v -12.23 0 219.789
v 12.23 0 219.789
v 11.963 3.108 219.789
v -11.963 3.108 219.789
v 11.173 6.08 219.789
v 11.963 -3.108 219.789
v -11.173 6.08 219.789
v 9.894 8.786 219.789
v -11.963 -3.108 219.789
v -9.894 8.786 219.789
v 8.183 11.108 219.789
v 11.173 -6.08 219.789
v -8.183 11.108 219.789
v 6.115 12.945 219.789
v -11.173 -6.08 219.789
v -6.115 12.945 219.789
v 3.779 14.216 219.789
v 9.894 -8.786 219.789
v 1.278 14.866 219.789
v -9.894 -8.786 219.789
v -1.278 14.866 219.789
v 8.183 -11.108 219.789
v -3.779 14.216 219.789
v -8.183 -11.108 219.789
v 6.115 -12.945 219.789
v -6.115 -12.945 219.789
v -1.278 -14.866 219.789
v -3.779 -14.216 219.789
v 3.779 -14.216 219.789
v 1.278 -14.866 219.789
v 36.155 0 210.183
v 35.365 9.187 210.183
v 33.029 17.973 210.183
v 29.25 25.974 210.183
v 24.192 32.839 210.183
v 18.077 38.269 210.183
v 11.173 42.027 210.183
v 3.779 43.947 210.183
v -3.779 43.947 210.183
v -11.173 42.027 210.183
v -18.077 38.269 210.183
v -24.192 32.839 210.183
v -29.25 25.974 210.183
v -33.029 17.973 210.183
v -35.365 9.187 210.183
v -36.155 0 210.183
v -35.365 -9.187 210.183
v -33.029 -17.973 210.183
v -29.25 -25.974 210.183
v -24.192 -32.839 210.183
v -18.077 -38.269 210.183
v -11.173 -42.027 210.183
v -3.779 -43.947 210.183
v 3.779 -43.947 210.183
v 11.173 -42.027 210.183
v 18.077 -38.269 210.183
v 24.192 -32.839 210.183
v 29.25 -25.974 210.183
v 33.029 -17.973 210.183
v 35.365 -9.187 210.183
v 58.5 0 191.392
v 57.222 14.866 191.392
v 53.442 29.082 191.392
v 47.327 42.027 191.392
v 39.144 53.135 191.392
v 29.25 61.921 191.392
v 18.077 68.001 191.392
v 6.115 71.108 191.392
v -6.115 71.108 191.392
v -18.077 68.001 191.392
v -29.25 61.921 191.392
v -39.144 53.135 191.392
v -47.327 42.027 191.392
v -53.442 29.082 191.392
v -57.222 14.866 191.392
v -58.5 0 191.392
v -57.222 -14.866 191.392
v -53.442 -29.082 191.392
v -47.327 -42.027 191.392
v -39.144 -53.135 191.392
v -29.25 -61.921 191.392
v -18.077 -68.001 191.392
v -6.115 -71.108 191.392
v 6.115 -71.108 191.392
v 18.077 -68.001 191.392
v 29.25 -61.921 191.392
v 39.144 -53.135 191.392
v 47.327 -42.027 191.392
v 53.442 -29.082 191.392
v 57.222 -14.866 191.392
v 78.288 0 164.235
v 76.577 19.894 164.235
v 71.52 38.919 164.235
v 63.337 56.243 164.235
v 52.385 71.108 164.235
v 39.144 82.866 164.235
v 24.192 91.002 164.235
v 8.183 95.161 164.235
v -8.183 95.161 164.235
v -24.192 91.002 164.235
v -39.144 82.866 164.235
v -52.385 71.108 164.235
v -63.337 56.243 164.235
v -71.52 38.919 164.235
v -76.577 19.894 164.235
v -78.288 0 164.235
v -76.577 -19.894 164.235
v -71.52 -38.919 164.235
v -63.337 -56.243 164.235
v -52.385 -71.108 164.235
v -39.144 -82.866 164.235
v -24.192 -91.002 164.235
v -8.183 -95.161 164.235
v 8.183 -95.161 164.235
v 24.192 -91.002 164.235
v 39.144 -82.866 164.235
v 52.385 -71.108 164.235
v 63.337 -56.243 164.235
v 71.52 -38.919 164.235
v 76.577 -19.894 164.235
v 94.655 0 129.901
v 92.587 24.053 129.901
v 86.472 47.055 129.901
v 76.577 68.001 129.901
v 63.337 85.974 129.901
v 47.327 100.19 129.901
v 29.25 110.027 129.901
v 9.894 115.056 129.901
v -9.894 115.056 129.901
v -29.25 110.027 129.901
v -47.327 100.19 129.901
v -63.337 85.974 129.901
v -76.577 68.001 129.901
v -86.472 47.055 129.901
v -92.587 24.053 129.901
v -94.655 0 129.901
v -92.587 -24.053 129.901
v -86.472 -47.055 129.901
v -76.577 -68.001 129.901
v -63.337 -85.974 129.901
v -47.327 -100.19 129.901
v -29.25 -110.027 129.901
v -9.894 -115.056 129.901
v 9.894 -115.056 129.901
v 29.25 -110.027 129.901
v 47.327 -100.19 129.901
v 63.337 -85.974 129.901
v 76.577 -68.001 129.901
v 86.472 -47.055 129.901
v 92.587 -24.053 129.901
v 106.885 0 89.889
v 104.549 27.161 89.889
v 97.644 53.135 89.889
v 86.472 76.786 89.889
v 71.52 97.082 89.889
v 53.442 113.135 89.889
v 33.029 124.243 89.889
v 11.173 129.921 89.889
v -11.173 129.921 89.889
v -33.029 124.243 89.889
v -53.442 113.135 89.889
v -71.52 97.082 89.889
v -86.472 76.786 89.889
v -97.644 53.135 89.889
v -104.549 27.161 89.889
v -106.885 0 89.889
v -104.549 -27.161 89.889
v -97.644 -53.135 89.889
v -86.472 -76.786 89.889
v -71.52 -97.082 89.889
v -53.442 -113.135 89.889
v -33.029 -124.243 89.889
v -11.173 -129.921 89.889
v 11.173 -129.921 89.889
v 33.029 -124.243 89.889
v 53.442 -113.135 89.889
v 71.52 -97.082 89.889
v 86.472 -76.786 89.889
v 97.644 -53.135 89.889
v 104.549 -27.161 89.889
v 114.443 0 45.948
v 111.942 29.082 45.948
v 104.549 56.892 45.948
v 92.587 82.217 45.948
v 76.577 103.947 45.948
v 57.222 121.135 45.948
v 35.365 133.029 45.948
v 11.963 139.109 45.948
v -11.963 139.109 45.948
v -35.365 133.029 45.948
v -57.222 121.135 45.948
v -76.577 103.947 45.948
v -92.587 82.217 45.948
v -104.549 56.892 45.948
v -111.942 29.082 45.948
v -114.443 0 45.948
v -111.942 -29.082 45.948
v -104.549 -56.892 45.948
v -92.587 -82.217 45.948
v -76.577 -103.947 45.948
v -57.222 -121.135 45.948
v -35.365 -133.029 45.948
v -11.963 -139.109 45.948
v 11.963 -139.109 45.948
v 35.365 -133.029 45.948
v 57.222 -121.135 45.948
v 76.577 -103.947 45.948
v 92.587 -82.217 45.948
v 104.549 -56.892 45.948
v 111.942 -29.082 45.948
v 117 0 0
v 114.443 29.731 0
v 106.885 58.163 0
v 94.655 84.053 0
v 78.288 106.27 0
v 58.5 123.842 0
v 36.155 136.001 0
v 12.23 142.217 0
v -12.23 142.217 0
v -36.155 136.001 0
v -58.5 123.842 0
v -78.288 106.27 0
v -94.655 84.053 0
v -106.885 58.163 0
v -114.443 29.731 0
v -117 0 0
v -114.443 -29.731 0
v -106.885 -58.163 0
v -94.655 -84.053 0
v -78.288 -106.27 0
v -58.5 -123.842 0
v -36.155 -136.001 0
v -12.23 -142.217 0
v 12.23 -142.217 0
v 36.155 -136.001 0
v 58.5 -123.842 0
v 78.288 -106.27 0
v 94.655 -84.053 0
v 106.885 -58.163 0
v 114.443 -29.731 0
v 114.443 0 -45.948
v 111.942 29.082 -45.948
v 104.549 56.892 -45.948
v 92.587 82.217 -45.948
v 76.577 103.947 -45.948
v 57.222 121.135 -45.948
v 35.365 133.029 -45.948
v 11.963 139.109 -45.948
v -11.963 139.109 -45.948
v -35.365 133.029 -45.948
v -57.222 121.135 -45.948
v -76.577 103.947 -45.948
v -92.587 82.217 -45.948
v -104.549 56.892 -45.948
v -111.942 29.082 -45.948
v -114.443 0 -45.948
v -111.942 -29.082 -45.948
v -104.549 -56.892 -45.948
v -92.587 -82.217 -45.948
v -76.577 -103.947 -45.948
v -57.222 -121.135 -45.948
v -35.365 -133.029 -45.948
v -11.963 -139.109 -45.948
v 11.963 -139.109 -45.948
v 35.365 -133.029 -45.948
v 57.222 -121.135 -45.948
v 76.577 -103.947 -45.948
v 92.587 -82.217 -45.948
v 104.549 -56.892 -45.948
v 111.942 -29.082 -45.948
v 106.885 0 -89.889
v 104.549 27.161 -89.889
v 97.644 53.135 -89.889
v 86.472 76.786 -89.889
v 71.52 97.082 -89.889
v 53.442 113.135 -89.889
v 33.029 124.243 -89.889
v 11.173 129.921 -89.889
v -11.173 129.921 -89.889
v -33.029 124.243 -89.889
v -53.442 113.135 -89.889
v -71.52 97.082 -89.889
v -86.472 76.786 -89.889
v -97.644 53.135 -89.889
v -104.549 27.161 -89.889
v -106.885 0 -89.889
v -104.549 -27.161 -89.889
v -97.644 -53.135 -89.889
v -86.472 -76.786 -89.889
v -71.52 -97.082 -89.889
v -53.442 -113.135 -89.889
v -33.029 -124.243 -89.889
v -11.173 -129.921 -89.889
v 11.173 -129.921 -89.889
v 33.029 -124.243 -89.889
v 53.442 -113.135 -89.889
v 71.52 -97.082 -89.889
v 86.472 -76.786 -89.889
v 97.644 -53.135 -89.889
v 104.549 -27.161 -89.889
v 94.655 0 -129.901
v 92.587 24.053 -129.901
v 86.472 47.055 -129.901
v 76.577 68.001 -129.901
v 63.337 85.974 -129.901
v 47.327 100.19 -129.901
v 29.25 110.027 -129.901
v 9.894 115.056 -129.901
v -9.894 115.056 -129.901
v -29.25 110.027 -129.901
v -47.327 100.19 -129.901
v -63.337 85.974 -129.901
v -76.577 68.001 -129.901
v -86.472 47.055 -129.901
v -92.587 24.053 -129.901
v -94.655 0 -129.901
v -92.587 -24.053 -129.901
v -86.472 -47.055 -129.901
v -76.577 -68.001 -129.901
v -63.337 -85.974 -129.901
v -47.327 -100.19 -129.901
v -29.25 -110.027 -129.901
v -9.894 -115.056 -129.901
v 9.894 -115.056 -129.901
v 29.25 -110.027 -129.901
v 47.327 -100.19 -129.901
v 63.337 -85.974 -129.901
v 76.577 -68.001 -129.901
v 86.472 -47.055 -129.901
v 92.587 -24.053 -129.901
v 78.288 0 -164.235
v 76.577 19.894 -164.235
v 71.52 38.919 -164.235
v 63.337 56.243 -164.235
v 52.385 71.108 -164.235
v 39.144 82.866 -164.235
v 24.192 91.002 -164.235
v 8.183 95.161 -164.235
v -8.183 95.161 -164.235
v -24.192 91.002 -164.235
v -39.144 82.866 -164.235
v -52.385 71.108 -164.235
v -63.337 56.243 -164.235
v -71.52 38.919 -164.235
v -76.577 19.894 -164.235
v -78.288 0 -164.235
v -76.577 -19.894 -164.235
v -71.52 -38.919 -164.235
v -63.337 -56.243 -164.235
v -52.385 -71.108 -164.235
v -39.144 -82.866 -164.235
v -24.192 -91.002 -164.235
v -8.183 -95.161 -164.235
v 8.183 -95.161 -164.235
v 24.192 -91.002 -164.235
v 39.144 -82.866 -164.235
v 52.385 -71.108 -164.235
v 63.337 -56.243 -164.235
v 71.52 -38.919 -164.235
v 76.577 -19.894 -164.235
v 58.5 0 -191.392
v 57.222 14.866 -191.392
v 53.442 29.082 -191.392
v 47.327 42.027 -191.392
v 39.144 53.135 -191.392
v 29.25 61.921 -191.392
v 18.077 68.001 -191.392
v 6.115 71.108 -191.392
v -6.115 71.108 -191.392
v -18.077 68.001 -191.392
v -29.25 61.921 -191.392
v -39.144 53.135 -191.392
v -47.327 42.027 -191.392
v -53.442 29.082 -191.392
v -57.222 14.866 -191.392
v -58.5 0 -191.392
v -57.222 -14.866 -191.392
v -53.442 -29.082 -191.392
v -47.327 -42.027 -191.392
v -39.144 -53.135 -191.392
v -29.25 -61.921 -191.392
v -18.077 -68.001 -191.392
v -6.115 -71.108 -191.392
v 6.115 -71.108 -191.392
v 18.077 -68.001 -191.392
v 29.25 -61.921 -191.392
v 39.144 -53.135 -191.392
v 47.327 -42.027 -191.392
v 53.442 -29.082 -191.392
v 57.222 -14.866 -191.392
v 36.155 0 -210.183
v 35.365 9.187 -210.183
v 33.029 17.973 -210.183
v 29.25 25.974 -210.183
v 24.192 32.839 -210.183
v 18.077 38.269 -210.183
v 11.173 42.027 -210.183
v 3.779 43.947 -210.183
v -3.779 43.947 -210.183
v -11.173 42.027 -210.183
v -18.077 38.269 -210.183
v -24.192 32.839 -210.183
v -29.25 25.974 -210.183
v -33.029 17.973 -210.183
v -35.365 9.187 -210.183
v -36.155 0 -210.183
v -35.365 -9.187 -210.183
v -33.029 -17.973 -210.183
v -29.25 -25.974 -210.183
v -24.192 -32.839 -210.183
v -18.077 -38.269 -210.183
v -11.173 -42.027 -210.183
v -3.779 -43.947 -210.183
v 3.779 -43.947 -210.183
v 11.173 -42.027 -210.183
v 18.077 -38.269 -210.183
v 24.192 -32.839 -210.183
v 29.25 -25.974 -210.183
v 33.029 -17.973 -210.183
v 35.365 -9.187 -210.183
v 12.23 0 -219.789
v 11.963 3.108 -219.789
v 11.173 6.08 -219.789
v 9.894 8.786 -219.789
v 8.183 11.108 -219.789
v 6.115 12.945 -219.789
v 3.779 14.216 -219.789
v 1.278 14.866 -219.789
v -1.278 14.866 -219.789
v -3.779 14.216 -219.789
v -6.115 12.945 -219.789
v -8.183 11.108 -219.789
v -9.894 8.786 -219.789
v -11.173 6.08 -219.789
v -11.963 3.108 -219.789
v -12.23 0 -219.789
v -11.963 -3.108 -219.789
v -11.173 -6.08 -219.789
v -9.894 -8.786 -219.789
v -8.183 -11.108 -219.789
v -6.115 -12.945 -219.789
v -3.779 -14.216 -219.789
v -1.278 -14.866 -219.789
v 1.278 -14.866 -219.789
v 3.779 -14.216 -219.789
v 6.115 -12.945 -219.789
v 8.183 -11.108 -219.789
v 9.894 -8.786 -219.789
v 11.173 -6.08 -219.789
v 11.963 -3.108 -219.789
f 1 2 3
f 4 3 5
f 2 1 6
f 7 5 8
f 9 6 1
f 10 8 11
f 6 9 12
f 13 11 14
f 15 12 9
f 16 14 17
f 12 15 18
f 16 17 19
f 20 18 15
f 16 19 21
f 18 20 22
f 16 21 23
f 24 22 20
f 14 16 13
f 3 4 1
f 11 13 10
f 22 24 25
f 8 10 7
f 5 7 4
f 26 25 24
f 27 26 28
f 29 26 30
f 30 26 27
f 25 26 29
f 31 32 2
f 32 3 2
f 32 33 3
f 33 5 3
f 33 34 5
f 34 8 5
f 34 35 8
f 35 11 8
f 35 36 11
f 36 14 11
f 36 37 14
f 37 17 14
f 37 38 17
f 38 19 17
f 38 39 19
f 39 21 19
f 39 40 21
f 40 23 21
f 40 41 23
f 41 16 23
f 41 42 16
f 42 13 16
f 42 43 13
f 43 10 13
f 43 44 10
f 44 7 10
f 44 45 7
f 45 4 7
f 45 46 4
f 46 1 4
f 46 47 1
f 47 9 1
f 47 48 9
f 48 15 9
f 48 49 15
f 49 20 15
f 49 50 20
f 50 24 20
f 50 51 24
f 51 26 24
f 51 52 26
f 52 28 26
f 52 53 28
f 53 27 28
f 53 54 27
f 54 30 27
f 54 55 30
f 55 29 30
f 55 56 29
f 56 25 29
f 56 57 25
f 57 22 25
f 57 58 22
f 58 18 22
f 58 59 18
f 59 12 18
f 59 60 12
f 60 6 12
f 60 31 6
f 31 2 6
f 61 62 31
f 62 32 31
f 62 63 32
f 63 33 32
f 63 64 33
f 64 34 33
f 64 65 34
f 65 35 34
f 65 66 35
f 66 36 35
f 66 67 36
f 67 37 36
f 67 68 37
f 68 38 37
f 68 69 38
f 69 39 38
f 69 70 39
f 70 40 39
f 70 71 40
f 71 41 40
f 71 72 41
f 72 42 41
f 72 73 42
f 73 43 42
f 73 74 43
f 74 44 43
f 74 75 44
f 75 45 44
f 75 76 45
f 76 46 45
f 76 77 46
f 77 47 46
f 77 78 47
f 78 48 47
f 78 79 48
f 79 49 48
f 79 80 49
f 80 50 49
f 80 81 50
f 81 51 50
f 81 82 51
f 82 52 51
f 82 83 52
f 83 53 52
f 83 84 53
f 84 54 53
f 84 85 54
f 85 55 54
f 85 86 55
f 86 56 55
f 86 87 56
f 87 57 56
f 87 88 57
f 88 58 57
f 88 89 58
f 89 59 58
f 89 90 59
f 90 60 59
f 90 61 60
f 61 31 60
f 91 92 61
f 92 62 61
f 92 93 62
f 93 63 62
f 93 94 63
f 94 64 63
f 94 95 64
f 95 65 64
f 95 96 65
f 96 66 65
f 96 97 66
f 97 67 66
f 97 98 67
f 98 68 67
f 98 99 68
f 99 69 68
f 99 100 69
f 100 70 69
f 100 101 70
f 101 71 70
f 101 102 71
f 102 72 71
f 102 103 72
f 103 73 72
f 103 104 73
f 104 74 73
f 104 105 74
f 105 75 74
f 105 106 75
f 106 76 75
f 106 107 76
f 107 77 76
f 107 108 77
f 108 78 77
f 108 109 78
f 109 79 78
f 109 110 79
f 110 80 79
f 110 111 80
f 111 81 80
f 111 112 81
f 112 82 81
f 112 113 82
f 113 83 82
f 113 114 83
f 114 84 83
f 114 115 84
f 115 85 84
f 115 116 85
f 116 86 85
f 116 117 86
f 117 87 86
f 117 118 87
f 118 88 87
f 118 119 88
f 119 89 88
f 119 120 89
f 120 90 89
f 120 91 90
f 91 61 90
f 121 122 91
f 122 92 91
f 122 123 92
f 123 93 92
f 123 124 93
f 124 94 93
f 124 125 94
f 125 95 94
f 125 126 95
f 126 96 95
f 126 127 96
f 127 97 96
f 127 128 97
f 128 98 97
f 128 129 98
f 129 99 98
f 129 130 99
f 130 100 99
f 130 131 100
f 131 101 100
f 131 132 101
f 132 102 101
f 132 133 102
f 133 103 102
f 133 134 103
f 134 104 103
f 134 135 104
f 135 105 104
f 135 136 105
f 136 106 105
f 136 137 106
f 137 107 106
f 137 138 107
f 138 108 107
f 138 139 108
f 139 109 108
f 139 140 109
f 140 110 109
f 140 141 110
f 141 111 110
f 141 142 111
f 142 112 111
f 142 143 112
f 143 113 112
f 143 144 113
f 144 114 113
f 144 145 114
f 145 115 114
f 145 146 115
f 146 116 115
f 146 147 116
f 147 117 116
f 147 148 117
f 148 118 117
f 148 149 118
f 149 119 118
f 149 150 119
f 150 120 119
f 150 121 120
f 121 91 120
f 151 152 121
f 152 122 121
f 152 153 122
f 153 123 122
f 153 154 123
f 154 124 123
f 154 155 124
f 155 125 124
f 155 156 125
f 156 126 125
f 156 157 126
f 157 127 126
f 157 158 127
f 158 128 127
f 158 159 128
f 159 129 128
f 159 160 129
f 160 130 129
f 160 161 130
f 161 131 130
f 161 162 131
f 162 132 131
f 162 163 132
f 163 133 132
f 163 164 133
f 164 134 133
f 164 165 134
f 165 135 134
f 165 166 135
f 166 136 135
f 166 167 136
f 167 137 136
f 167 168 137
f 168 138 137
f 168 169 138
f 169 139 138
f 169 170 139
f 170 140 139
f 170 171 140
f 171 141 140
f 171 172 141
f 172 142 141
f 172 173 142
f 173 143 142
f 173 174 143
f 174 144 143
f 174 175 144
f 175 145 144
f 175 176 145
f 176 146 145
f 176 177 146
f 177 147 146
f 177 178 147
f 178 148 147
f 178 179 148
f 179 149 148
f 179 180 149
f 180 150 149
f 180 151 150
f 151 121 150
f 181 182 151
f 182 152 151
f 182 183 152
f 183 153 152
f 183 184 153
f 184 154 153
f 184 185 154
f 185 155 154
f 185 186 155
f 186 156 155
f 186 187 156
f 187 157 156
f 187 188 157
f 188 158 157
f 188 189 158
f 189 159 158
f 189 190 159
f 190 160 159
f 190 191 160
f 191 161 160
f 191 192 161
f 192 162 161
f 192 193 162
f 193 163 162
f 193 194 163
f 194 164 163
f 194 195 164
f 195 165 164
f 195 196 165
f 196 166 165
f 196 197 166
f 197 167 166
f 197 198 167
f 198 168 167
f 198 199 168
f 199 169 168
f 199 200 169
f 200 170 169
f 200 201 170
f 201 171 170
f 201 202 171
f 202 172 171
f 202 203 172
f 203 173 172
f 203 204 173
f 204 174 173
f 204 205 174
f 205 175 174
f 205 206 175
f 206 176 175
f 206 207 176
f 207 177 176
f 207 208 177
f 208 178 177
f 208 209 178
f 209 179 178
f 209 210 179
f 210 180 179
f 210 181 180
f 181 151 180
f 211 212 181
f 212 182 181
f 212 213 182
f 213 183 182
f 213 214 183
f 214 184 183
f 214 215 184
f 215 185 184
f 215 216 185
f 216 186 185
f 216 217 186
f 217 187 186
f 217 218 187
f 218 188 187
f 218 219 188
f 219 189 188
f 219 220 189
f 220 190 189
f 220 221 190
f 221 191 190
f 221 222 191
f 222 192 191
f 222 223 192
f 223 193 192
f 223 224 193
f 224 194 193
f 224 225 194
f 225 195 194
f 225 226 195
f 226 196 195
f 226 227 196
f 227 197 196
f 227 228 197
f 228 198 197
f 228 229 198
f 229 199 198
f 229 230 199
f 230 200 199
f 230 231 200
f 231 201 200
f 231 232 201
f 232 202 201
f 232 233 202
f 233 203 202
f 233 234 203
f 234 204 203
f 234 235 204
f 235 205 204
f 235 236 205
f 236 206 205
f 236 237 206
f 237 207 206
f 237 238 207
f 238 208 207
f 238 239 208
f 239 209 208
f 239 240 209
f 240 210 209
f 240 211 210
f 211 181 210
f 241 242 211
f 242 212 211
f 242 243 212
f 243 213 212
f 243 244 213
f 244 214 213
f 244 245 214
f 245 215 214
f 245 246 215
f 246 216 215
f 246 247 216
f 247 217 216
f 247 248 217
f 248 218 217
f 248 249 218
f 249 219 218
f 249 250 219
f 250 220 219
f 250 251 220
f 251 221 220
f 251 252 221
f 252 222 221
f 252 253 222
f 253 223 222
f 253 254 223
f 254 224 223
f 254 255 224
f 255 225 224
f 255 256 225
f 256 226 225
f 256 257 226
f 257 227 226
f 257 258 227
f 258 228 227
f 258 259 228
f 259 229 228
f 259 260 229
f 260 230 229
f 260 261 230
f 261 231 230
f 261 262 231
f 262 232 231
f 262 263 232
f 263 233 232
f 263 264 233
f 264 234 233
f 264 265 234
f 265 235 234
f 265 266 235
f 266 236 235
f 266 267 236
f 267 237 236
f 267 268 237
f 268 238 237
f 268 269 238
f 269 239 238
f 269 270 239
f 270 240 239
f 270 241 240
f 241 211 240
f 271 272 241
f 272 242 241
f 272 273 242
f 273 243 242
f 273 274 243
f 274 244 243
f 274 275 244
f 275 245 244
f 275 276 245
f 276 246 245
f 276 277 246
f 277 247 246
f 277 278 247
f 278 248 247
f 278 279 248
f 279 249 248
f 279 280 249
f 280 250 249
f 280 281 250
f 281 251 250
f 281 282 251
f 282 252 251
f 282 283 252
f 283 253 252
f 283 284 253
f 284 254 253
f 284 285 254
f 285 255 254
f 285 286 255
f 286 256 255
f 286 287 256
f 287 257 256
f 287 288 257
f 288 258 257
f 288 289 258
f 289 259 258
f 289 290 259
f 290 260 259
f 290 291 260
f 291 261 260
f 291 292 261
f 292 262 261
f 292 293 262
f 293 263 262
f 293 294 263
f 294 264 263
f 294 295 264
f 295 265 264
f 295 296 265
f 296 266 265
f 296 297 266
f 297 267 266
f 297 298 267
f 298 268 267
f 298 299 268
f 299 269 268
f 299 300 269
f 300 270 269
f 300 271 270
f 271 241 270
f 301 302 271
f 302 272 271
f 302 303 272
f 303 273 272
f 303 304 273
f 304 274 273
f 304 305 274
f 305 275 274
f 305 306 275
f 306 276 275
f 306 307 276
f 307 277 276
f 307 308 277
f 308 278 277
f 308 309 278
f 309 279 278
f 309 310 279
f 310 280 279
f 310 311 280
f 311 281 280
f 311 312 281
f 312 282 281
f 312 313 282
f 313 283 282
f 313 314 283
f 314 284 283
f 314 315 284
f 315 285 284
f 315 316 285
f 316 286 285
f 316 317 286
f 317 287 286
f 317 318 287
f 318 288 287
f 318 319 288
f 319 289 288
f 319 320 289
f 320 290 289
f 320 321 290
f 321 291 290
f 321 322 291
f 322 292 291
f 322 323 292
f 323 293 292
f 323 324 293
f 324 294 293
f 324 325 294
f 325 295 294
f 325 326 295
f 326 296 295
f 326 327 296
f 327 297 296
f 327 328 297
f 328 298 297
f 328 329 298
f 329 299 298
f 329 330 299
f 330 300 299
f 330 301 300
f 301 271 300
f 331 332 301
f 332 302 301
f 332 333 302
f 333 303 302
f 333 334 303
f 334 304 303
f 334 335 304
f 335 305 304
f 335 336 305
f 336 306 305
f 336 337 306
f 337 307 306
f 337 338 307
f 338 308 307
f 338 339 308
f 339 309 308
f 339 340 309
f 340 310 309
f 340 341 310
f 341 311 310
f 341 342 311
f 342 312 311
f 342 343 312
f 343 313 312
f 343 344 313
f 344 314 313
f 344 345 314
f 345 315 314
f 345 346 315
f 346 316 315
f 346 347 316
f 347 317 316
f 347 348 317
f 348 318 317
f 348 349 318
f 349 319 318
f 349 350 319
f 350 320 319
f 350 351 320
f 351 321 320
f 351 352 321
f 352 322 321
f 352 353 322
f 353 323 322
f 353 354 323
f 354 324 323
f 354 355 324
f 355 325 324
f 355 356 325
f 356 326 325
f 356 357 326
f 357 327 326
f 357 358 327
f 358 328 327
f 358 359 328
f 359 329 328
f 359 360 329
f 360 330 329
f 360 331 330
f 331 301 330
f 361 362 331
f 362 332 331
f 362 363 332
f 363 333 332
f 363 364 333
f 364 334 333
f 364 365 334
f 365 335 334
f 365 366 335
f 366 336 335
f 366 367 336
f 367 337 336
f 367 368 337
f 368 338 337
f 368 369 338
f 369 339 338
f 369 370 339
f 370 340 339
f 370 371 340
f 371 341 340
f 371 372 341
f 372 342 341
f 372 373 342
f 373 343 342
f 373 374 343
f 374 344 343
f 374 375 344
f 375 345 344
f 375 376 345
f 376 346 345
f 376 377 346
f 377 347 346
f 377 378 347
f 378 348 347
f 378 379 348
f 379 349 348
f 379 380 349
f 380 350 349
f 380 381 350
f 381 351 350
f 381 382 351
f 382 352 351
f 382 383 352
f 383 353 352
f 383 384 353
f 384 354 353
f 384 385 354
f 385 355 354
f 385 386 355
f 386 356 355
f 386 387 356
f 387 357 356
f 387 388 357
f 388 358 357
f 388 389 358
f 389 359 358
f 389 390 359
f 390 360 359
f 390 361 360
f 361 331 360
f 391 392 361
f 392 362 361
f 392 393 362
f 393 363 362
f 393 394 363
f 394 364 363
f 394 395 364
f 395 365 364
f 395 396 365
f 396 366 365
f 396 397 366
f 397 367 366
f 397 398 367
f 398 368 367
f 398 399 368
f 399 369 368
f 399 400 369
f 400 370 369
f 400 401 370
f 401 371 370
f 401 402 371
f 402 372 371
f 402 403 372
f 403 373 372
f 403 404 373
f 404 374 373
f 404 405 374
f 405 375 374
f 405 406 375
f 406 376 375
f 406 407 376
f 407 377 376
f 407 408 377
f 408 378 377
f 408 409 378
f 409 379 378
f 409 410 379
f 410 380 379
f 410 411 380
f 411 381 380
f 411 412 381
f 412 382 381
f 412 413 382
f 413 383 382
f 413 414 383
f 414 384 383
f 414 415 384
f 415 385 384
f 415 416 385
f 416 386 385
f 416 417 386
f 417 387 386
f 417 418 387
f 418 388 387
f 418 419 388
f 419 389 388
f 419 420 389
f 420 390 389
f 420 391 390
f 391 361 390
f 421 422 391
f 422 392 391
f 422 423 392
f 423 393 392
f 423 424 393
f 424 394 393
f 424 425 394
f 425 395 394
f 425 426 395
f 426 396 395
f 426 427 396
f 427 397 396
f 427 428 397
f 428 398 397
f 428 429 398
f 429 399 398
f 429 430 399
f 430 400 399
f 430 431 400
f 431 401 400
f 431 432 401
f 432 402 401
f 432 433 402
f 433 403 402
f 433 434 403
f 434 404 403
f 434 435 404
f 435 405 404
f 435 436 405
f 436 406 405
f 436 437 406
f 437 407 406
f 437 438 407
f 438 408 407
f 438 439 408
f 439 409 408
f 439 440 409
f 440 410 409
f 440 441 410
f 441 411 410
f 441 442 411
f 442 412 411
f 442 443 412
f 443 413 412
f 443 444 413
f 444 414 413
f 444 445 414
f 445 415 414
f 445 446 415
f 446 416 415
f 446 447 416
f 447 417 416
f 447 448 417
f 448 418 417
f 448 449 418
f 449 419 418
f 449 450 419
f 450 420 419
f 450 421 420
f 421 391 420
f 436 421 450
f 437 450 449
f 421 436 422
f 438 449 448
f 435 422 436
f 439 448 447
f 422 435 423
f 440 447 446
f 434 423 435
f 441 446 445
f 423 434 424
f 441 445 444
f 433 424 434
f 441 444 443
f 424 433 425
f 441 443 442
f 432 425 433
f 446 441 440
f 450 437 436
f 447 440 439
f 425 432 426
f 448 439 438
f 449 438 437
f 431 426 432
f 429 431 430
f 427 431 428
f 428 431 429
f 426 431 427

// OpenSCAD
// Generated by SolidPython 1.0.1 on 2020-07-29 00:46:48


scale(v = [9, 11, 17]) {
	sphere(r = 13);
}
/***********************************************
*********      SolidPython code:      **********
************************************************
 
# import packages: SolidPython
from solid import *
from solid.utils import *
from itertools import chain, combinations, permutations


class Resize:

    def __init__(self, scad_file):
        self.scad_file = scad_file
        #self.scad_file = import_scad(scad_file)
        # cone/cylinder param:
        self.r1 = 0
        self.r2 = 0
        self.h = 0
        # rectangular prism param:
        self.w = 0
        self.l = 0
        # ellipse param:
        self.r = 0

    # import OpenScad code (file name corresponds to shape)


    # classify shape + parameters
    def assign(self, param1, param2, param3):
        if self.scad_file == 'cone.scad':
            self.r1 = param1
            self.r2 = param2
            self.h = param3
        elif self.scad_file == 'cylinder.scad':
            self.r1 = param1
            self.r2 = param2
            self.h = param3
        elif self.scad_file == 'rectangularPrism.scad':
            self.h = param1
            self.l = param2
            self.w = param3
        else:
            self.r = param1
            self.h = param2

    # resize parameters
    def iterate(self):
        x = range(3, 20, 2)
        i = 1
        if self.scad_file == 'cone.scad':
            tempList = list(permutations(x, 2))
            for temp in tempList:
                param1 = temp[0]
                param2 = temp[1]
                filepath = 'produced_scad_files/' + 'cone' + str(param1) + '_' + str(param2) + '_' + '.scad'
                scad_render_to_file(cylinder(h=param1, r1=param2, r2=0), filepath)

        elif self.scad_file == 'cylinder.scad':
            tempList = list(permutations(x, 3))
            for temp in tempList:
                param1 = temp[0]
                param2 = temp[1]
                filepath = 'produced_scad_files/' + 'cylinder' + str(param1) + '_' + str(param2) + '_' + '.scad'
                scad_render_to_file(cylinder(h=param1, r1=param2, r2=param2), filepath)

        elif self.scad_file == 'rectangularPrism.scad':
            tempList = list(permutations(x, 3))
            for temp in tempList:
                param1 = temp[0]
                param2 = temp[1]
                param3 = temp[2]
                filepath = 'produced_scad_files/' + 'rectangularPrism' + str(param1) + '_' + str(param2) + '_' + str(
                    param3) + '.scad'
                scad_render_to_file(cube(size=(param1, param2, param3)), filepath)

        elif self.scad_file == 'ellipse.scad':
            tempList = list(permutations(x, 4))
            for temp in tempList:
                param1 = temp[0]
                param2 = temp[1]
                param3 = temp[2]
                param4 = temp[3]
                filepath = 'produced_scad_files/' + 'ellipse' + str(param1) + '_' + str(param2) + '_' + str(param3) + '_' + str(param4) + '.scad'
                scad_render_to_file(scale([param1, param2, param3])(sphere(r=param4)), filepath)

    def render_to_scadfile(self):
        scad_render_to_file(scad, 'example.scad') 
 
************************************************/
